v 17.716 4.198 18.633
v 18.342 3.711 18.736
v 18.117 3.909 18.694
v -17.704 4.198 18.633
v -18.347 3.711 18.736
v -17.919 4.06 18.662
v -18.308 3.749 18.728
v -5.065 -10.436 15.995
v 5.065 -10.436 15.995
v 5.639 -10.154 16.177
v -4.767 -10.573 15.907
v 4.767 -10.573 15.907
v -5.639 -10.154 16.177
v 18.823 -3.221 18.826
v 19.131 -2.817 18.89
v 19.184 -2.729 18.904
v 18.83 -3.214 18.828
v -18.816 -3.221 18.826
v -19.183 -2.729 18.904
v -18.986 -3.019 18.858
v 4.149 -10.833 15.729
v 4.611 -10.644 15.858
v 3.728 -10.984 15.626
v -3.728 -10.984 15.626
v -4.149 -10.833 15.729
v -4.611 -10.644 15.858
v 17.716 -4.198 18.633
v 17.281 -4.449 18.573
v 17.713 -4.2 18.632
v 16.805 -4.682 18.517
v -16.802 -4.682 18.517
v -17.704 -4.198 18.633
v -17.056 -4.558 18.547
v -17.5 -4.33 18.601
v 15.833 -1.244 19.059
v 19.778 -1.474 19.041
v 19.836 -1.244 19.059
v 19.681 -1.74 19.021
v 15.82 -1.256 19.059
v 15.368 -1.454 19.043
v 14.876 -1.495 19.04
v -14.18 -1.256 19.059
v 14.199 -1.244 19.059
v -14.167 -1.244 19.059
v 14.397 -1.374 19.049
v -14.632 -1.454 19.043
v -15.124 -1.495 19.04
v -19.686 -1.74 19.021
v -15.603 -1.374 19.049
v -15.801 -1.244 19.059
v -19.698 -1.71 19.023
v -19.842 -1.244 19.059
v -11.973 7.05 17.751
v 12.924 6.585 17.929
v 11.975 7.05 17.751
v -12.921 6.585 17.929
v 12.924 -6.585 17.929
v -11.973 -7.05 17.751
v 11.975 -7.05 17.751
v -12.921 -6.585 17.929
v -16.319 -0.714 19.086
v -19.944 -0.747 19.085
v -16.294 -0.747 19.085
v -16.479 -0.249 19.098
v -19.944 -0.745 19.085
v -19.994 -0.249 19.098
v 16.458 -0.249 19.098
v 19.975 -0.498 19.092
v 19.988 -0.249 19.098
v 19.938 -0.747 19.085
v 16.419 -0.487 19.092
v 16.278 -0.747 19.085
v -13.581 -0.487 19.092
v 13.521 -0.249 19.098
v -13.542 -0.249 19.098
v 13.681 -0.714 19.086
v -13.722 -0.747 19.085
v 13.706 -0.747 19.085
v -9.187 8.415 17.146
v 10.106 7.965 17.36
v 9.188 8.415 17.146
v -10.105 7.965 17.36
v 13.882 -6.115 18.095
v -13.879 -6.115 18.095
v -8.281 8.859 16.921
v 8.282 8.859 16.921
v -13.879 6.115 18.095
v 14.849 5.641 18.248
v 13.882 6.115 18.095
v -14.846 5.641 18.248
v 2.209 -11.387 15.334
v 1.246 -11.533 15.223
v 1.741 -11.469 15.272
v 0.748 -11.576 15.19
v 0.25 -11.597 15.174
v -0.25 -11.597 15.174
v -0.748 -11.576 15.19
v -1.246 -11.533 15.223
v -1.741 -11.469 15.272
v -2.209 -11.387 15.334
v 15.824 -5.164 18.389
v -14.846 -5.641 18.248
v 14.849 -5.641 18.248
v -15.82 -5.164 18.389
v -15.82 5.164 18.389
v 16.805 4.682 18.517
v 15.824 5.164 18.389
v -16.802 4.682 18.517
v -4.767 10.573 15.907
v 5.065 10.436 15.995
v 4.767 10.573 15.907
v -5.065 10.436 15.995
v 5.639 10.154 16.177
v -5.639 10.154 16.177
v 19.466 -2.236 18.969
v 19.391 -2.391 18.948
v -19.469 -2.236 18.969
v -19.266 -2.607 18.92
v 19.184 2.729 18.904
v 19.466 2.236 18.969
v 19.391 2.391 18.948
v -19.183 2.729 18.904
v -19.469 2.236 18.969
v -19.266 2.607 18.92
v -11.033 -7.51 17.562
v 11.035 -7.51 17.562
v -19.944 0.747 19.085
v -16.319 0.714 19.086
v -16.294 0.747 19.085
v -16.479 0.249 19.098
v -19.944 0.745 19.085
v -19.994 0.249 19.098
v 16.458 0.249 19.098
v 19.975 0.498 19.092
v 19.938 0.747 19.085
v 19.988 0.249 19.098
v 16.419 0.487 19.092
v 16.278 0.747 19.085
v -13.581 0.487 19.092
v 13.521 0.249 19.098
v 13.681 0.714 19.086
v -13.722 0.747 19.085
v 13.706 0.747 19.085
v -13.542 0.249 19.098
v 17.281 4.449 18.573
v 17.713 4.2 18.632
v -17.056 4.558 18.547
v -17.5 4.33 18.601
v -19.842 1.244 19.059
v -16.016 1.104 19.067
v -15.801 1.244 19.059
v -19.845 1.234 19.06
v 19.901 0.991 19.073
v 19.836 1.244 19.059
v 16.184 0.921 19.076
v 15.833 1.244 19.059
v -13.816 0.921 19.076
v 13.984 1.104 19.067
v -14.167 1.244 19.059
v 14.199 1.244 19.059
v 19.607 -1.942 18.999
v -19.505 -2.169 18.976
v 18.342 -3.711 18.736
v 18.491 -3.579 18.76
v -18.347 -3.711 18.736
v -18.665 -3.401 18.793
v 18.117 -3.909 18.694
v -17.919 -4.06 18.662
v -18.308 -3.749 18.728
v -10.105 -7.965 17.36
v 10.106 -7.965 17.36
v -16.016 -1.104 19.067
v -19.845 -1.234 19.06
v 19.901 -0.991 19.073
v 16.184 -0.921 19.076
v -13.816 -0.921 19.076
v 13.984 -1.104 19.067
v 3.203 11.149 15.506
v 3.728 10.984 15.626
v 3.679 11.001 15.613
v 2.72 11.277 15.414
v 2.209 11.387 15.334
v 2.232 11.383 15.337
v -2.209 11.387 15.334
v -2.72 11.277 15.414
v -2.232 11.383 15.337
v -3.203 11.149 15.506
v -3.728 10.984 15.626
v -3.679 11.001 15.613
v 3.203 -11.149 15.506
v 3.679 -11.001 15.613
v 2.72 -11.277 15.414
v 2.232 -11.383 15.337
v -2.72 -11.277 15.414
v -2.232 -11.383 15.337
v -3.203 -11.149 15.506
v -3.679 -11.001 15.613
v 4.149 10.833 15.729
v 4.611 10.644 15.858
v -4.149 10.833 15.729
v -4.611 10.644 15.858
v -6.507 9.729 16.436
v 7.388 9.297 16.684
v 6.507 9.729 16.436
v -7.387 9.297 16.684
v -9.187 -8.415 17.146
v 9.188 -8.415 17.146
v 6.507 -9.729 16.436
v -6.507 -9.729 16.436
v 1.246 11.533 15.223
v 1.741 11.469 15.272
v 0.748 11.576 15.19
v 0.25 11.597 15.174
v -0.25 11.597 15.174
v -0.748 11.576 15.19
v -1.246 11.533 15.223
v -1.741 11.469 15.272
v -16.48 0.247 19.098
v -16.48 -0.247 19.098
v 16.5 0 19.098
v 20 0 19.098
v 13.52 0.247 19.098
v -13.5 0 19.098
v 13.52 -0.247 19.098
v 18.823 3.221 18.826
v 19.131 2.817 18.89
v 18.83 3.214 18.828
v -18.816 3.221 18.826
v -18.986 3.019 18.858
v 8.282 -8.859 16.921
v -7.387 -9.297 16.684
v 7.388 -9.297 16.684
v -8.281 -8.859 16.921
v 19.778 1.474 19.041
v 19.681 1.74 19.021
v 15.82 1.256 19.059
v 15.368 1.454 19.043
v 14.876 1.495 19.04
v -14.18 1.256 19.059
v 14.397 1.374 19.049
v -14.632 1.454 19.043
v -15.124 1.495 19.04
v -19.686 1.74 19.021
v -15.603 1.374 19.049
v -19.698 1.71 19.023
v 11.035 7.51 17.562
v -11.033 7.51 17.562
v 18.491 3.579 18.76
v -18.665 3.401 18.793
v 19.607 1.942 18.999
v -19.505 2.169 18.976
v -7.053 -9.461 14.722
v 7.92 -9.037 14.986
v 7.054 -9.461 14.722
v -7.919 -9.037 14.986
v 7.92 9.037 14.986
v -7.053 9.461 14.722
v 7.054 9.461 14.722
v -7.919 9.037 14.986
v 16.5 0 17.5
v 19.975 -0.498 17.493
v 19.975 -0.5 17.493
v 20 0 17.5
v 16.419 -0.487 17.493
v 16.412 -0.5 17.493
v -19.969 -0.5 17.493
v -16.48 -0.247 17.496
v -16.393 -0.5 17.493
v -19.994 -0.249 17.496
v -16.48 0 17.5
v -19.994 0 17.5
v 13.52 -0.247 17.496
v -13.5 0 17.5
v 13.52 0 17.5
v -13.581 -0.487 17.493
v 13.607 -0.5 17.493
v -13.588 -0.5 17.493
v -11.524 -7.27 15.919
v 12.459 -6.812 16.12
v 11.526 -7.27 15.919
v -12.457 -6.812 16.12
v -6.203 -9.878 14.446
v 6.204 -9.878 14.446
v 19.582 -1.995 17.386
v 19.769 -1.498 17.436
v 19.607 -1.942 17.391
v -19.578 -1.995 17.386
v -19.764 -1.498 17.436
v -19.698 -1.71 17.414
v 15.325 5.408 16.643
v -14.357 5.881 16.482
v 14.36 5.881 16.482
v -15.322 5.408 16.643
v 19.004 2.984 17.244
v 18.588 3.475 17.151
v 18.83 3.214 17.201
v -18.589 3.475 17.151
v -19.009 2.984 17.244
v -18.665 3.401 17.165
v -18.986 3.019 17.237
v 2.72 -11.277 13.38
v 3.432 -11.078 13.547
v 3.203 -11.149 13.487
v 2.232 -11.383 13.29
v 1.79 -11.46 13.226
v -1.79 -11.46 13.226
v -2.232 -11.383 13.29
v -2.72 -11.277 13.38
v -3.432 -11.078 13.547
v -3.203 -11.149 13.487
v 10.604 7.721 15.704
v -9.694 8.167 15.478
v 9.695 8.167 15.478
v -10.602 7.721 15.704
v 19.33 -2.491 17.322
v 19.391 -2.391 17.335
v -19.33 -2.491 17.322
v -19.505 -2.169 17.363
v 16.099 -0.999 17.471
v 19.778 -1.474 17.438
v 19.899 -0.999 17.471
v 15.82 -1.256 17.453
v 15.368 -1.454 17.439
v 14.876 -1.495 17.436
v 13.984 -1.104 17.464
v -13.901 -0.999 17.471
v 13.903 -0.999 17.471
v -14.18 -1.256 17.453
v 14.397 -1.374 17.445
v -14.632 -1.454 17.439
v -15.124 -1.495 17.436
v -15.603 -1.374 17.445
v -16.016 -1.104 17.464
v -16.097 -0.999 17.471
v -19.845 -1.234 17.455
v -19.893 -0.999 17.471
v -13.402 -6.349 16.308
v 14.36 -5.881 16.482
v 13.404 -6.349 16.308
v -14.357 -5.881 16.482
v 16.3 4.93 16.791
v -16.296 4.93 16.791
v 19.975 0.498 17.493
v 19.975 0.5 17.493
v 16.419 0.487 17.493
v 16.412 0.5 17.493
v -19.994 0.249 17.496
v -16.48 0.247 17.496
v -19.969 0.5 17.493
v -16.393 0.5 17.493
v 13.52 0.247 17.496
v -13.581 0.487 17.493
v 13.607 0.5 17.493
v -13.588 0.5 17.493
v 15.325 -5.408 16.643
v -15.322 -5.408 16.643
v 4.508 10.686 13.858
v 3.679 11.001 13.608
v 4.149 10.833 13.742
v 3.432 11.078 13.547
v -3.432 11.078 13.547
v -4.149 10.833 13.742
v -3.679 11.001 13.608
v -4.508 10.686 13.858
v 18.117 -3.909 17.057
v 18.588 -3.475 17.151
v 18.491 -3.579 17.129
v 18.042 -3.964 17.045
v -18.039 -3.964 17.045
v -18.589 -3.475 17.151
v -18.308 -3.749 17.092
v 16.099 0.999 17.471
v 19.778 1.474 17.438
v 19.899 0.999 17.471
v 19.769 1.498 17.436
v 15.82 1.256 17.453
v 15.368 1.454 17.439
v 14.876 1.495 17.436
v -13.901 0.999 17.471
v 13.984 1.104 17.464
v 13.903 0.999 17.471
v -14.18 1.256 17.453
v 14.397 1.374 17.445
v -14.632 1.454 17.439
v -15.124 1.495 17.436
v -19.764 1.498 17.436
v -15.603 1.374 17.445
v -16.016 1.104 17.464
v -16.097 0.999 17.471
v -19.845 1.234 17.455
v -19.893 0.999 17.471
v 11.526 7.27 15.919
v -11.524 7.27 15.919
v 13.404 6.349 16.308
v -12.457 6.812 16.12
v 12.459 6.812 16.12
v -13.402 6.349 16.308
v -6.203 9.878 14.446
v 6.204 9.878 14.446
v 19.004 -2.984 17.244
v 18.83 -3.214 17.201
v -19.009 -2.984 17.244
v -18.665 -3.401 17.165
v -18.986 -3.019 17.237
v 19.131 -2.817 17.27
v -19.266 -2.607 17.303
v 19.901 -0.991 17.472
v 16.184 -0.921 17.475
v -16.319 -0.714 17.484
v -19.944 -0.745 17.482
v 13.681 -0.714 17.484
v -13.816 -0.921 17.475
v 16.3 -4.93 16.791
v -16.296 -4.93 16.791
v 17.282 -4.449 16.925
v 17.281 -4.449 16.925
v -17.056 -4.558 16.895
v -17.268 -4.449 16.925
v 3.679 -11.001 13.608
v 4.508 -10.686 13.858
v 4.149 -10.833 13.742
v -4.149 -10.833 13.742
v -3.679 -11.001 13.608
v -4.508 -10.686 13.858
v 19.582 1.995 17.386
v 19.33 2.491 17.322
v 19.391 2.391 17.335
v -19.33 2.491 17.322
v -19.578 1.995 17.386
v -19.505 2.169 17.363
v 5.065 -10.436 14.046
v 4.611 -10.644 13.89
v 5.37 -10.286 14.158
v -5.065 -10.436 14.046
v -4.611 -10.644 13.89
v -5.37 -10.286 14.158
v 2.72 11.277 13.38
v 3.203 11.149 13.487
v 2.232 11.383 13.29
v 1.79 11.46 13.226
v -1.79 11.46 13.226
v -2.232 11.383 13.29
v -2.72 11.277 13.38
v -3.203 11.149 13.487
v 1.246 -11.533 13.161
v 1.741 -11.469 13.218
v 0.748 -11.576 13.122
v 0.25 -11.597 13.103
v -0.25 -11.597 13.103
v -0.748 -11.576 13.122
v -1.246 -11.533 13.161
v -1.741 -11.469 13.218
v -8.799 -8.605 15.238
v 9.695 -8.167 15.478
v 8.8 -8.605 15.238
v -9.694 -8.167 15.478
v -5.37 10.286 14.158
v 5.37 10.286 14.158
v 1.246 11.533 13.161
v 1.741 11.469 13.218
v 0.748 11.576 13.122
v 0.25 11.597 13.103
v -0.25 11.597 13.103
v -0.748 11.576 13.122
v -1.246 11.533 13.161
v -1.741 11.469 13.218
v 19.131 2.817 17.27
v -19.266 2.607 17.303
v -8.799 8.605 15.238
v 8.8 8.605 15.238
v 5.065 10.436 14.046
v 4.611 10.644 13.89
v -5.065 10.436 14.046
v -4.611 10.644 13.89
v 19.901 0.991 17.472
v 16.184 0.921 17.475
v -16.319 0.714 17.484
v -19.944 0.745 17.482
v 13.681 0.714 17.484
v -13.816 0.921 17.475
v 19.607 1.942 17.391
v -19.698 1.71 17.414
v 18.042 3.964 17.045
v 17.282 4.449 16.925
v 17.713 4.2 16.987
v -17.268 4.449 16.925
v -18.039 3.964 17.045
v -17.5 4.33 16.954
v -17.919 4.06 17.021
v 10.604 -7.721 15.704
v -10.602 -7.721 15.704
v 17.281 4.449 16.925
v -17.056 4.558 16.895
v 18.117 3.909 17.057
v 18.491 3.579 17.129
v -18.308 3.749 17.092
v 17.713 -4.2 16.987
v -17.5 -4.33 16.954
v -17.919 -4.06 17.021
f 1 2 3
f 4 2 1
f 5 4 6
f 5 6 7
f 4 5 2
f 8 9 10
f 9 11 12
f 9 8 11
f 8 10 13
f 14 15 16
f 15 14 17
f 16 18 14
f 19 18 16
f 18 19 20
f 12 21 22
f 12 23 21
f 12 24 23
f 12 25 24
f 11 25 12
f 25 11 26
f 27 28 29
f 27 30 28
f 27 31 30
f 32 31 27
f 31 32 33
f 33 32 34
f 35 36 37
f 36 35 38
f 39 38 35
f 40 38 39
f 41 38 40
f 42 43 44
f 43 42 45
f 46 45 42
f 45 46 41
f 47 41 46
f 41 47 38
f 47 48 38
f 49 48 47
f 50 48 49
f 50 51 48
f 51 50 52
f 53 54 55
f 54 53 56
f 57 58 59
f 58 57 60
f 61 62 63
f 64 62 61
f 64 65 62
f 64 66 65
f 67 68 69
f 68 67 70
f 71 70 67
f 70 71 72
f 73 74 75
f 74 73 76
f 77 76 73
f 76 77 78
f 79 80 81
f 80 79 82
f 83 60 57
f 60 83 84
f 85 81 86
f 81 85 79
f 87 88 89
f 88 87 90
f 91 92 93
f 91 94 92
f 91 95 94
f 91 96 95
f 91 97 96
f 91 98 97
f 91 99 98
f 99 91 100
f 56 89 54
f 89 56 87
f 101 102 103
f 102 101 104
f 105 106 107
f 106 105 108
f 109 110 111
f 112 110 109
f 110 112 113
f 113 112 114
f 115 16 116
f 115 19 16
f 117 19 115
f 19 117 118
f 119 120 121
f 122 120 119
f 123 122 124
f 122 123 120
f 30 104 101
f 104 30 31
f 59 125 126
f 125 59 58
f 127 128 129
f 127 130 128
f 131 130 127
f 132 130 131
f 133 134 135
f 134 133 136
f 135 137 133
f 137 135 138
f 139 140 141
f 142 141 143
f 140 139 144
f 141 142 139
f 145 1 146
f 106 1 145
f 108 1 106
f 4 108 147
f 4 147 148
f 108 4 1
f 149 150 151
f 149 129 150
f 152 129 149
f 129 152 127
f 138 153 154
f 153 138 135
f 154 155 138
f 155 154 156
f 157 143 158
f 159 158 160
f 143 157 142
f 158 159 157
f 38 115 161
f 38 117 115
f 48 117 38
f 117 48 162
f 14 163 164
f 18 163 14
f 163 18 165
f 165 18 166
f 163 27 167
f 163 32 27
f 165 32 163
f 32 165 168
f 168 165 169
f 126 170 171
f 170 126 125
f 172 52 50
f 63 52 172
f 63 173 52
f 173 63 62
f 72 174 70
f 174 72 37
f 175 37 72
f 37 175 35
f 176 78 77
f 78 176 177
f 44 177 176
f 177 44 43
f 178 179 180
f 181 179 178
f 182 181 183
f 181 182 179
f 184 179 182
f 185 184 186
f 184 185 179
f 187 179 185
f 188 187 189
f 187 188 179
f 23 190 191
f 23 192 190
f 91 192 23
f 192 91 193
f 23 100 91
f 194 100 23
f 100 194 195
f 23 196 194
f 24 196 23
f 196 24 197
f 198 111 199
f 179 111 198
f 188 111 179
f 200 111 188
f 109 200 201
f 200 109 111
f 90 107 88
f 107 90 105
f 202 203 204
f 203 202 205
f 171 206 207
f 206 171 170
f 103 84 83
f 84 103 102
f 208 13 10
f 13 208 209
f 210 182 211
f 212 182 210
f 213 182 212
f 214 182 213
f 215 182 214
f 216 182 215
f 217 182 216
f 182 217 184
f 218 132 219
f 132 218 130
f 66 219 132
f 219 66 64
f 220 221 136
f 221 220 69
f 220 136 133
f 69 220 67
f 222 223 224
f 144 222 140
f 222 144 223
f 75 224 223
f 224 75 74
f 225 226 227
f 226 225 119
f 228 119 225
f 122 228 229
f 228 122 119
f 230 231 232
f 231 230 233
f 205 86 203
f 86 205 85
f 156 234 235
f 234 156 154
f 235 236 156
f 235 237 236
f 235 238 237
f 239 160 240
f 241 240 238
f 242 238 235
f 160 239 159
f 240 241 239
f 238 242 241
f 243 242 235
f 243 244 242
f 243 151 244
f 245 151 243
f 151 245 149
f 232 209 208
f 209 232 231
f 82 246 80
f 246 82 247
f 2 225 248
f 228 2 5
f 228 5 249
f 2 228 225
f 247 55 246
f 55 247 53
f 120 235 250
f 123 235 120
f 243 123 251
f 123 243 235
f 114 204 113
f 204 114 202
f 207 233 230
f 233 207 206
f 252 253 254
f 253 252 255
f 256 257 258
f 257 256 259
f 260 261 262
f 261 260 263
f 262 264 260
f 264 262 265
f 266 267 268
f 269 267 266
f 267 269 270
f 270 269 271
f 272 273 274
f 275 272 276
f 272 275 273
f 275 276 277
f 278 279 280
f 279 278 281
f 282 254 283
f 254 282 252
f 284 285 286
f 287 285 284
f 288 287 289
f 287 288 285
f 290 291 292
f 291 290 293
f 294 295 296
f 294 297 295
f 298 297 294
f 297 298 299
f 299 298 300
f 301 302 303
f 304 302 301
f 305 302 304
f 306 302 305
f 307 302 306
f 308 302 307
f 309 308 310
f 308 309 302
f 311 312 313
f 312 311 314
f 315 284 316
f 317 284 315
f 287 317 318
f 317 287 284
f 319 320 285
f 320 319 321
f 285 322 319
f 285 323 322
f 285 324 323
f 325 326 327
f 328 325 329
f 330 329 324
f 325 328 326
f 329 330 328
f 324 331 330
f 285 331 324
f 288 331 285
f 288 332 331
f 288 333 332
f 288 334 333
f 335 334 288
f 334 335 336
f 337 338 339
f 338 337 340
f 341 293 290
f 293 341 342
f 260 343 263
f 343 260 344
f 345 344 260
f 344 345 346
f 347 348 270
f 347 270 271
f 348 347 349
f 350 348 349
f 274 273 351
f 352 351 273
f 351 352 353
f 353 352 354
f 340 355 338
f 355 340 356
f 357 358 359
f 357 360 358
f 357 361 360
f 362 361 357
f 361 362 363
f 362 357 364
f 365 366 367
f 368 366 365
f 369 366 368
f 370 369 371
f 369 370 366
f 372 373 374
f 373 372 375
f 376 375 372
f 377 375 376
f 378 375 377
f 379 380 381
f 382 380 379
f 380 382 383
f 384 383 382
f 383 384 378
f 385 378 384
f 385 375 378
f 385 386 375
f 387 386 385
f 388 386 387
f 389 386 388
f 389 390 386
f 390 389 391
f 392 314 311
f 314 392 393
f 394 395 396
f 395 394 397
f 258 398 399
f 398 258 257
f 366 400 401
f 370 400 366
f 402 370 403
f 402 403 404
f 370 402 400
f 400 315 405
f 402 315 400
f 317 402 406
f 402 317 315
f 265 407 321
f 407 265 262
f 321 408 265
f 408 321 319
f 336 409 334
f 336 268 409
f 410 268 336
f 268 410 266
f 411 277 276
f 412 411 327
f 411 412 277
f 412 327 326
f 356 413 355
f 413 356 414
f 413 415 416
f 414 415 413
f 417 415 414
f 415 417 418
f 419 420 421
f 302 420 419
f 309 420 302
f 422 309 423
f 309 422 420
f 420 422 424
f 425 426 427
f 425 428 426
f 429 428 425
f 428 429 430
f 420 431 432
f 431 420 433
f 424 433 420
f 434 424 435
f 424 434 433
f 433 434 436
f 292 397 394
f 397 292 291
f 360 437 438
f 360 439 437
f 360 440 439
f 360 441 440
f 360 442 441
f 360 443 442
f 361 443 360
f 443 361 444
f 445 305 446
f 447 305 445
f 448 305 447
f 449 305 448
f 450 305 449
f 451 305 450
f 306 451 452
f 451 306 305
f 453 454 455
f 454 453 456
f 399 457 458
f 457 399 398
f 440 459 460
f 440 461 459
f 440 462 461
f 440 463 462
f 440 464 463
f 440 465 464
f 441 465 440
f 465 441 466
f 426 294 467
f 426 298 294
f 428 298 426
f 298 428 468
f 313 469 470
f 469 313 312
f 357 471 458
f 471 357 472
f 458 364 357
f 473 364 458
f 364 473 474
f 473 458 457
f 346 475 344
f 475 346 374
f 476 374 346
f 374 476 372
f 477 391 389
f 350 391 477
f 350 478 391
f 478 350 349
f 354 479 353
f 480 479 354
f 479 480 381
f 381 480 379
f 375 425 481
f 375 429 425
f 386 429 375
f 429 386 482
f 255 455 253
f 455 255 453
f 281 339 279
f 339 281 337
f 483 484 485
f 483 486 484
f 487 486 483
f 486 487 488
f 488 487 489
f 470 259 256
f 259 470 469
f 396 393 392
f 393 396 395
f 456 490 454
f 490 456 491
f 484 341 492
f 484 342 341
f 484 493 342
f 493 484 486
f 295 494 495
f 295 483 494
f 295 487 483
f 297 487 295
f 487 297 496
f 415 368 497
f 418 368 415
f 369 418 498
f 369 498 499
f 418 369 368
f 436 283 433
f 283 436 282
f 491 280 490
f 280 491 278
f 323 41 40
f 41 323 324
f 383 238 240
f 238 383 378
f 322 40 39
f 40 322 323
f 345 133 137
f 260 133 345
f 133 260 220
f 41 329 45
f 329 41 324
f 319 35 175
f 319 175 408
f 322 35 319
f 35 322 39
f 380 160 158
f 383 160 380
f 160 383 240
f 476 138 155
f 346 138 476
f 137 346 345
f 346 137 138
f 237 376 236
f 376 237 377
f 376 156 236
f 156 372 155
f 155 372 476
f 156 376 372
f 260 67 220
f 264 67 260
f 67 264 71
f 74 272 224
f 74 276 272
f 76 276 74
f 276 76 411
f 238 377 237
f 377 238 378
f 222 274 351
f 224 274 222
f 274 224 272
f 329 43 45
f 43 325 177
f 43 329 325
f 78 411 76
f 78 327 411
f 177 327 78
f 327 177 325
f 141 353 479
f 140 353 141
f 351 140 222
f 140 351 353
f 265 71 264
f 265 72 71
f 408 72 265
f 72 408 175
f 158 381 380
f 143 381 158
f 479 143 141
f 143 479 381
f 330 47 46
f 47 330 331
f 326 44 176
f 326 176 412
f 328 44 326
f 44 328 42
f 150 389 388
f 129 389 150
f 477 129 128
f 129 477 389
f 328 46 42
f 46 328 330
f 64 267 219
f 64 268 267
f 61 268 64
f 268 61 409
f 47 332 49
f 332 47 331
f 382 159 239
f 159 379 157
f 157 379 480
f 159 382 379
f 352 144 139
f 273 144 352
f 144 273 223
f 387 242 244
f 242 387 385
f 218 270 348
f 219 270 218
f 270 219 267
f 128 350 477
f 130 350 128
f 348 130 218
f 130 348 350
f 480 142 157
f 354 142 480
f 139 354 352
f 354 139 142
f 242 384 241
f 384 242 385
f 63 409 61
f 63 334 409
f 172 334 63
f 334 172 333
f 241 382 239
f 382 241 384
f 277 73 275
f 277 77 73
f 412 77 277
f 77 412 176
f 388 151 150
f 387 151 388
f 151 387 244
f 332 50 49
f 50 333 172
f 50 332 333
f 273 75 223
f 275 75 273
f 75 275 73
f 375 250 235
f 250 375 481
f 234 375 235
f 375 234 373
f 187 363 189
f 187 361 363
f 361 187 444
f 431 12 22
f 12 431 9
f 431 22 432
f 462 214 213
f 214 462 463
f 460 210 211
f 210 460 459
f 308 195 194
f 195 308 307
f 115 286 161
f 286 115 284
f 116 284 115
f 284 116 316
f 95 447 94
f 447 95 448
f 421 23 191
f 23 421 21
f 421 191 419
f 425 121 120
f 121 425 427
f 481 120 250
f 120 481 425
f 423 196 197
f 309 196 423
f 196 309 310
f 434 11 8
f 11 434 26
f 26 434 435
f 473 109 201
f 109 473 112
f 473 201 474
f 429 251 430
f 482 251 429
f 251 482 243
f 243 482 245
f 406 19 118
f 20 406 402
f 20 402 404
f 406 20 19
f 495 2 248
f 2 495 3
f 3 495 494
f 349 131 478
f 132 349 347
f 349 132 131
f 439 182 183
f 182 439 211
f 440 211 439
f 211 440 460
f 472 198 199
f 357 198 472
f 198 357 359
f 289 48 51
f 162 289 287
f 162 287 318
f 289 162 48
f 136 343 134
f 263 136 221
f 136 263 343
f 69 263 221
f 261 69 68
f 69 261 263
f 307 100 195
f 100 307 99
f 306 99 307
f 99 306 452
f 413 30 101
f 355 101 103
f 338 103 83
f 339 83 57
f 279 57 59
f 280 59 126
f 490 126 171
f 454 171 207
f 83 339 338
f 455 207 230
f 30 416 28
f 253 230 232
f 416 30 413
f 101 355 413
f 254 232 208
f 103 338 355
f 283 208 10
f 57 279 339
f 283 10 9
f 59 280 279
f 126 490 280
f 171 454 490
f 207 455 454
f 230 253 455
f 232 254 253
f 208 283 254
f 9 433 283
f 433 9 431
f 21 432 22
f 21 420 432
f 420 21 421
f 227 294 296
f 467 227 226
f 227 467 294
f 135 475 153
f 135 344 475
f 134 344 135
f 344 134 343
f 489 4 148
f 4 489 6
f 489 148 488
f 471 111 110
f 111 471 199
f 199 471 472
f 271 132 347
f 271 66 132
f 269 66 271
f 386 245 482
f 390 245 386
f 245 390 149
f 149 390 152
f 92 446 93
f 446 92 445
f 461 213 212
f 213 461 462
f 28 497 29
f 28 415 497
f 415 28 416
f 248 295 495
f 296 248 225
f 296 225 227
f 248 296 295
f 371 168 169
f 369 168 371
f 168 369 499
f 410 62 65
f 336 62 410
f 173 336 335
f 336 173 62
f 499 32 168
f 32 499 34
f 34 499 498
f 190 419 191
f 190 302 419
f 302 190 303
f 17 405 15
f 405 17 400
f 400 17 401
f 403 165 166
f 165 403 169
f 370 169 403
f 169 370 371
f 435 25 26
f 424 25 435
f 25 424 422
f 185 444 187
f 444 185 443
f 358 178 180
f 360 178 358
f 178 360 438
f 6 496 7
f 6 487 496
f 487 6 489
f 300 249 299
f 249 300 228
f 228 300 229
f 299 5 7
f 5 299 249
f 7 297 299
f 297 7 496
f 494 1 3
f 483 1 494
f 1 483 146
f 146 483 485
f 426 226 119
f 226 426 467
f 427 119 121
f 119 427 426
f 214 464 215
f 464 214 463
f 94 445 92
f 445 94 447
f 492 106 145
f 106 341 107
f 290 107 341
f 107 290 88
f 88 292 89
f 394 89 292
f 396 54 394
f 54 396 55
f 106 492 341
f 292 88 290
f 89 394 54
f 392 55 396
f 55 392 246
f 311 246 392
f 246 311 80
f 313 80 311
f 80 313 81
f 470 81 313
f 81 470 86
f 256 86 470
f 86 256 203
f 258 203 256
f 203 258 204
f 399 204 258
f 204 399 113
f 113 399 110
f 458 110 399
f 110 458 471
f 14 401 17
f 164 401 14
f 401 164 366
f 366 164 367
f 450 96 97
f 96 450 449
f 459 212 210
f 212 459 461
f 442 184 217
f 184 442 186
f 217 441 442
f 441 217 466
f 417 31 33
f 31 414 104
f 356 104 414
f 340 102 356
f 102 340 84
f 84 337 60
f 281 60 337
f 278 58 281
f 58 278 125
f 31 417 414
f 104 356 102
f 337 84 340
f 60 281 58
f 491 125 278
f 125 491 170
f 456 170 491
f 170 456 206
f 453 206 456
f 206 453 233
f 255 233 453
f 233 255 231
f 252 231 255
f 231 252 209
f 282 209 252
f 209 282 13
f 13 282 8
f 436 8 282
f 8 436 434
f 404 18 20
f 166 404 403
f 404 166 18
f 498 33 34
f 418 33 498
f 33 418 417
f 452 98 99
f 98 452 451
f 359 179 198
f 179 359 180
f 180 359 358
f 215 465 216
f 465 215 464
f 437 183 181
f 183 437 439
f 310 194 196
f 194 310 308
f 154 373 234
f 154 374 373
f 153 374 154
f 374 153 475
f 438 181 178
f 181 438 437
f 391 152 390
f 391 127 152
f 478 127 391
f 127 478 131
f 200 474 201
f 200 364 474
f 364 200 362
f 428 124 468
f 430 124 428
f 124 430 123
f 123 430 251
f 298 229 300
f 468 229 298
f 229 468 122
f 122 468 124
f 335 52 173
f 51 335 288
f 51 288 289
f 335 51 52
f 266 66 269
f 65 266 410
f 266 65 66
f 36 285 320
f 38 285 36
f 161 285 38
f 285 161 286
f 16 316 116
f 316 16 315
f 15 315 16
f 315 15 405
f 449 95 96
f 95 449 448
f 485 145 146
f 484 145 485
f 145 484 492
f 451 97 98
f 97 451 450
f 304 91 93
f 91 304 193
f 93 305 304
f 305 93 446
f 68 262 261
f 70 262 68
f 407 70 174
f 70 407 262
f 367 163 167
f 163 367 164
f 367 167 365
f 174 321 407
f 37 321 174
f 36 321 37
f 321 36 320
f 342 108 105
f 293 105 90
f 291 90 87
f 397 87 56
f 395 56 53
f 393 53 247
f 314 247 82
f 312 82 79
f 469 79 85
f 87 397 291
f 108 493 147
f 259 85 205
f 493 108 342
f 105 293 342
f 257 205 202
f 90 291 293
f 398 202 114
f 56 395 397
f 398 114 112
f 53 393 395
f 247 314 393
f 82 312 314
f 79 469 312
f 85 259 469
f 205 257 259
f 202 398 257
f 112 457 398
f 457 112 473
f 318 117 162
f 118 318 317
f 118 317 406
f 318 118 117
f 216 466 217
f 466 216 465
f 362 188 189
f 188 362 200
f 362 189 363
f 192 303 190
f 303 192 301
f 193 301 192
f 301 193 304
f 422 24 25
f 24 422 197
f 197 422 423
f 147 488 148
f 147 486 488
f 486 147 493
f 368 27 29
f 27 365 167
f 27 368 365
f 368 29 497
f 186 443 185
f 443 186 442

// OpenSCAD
//Unfinished, unused
//Project: shovel guitar
$fa=1/2;
$fs=1/2;
shovel_d=35;
screws_dist=30;
mount_hole=3;
extra=5;
center_hole=6;
total_height=21;
od=18;
wall=1.6;
air=1;
bissl=1/100;

module surface_mount() {
  intersection() {
    rotate([0,90,0])difference() {
      cylinder(d=shovel_d+2*wall,h=screws_dist+2*extra,center=true);
      cylinder(d=shovel_d,h=screws_dist+2*extra+bissl,center=true);
      translate([(shovel_d+2*wall)/2,0,0]) cube([shovel_d+2*wall,shovel_d+2*wall,screws_dist+2*extra+bissl],center=true);
      rotate([0,-90,0])translate([screws_dist/2,0,0])cylinder(d=mount_hole,h=shovel_d);
      rotate([0,-90,0])translate([-screws_dist/2,0,0])cylinder(d=mount_hole,h=shovel_d);
    }
    hull() {
      cylinder(d=od+2*wall+2*air,h=shovel_d);
      translate([screws_dist/2,0,0])cylinder(d=2*extra,h=shovel_d);
      translate([-screws_dist/2,0,0])cylinder(d=2*extra,h=shovel_d);
    }
  }
}
surface_mount();
